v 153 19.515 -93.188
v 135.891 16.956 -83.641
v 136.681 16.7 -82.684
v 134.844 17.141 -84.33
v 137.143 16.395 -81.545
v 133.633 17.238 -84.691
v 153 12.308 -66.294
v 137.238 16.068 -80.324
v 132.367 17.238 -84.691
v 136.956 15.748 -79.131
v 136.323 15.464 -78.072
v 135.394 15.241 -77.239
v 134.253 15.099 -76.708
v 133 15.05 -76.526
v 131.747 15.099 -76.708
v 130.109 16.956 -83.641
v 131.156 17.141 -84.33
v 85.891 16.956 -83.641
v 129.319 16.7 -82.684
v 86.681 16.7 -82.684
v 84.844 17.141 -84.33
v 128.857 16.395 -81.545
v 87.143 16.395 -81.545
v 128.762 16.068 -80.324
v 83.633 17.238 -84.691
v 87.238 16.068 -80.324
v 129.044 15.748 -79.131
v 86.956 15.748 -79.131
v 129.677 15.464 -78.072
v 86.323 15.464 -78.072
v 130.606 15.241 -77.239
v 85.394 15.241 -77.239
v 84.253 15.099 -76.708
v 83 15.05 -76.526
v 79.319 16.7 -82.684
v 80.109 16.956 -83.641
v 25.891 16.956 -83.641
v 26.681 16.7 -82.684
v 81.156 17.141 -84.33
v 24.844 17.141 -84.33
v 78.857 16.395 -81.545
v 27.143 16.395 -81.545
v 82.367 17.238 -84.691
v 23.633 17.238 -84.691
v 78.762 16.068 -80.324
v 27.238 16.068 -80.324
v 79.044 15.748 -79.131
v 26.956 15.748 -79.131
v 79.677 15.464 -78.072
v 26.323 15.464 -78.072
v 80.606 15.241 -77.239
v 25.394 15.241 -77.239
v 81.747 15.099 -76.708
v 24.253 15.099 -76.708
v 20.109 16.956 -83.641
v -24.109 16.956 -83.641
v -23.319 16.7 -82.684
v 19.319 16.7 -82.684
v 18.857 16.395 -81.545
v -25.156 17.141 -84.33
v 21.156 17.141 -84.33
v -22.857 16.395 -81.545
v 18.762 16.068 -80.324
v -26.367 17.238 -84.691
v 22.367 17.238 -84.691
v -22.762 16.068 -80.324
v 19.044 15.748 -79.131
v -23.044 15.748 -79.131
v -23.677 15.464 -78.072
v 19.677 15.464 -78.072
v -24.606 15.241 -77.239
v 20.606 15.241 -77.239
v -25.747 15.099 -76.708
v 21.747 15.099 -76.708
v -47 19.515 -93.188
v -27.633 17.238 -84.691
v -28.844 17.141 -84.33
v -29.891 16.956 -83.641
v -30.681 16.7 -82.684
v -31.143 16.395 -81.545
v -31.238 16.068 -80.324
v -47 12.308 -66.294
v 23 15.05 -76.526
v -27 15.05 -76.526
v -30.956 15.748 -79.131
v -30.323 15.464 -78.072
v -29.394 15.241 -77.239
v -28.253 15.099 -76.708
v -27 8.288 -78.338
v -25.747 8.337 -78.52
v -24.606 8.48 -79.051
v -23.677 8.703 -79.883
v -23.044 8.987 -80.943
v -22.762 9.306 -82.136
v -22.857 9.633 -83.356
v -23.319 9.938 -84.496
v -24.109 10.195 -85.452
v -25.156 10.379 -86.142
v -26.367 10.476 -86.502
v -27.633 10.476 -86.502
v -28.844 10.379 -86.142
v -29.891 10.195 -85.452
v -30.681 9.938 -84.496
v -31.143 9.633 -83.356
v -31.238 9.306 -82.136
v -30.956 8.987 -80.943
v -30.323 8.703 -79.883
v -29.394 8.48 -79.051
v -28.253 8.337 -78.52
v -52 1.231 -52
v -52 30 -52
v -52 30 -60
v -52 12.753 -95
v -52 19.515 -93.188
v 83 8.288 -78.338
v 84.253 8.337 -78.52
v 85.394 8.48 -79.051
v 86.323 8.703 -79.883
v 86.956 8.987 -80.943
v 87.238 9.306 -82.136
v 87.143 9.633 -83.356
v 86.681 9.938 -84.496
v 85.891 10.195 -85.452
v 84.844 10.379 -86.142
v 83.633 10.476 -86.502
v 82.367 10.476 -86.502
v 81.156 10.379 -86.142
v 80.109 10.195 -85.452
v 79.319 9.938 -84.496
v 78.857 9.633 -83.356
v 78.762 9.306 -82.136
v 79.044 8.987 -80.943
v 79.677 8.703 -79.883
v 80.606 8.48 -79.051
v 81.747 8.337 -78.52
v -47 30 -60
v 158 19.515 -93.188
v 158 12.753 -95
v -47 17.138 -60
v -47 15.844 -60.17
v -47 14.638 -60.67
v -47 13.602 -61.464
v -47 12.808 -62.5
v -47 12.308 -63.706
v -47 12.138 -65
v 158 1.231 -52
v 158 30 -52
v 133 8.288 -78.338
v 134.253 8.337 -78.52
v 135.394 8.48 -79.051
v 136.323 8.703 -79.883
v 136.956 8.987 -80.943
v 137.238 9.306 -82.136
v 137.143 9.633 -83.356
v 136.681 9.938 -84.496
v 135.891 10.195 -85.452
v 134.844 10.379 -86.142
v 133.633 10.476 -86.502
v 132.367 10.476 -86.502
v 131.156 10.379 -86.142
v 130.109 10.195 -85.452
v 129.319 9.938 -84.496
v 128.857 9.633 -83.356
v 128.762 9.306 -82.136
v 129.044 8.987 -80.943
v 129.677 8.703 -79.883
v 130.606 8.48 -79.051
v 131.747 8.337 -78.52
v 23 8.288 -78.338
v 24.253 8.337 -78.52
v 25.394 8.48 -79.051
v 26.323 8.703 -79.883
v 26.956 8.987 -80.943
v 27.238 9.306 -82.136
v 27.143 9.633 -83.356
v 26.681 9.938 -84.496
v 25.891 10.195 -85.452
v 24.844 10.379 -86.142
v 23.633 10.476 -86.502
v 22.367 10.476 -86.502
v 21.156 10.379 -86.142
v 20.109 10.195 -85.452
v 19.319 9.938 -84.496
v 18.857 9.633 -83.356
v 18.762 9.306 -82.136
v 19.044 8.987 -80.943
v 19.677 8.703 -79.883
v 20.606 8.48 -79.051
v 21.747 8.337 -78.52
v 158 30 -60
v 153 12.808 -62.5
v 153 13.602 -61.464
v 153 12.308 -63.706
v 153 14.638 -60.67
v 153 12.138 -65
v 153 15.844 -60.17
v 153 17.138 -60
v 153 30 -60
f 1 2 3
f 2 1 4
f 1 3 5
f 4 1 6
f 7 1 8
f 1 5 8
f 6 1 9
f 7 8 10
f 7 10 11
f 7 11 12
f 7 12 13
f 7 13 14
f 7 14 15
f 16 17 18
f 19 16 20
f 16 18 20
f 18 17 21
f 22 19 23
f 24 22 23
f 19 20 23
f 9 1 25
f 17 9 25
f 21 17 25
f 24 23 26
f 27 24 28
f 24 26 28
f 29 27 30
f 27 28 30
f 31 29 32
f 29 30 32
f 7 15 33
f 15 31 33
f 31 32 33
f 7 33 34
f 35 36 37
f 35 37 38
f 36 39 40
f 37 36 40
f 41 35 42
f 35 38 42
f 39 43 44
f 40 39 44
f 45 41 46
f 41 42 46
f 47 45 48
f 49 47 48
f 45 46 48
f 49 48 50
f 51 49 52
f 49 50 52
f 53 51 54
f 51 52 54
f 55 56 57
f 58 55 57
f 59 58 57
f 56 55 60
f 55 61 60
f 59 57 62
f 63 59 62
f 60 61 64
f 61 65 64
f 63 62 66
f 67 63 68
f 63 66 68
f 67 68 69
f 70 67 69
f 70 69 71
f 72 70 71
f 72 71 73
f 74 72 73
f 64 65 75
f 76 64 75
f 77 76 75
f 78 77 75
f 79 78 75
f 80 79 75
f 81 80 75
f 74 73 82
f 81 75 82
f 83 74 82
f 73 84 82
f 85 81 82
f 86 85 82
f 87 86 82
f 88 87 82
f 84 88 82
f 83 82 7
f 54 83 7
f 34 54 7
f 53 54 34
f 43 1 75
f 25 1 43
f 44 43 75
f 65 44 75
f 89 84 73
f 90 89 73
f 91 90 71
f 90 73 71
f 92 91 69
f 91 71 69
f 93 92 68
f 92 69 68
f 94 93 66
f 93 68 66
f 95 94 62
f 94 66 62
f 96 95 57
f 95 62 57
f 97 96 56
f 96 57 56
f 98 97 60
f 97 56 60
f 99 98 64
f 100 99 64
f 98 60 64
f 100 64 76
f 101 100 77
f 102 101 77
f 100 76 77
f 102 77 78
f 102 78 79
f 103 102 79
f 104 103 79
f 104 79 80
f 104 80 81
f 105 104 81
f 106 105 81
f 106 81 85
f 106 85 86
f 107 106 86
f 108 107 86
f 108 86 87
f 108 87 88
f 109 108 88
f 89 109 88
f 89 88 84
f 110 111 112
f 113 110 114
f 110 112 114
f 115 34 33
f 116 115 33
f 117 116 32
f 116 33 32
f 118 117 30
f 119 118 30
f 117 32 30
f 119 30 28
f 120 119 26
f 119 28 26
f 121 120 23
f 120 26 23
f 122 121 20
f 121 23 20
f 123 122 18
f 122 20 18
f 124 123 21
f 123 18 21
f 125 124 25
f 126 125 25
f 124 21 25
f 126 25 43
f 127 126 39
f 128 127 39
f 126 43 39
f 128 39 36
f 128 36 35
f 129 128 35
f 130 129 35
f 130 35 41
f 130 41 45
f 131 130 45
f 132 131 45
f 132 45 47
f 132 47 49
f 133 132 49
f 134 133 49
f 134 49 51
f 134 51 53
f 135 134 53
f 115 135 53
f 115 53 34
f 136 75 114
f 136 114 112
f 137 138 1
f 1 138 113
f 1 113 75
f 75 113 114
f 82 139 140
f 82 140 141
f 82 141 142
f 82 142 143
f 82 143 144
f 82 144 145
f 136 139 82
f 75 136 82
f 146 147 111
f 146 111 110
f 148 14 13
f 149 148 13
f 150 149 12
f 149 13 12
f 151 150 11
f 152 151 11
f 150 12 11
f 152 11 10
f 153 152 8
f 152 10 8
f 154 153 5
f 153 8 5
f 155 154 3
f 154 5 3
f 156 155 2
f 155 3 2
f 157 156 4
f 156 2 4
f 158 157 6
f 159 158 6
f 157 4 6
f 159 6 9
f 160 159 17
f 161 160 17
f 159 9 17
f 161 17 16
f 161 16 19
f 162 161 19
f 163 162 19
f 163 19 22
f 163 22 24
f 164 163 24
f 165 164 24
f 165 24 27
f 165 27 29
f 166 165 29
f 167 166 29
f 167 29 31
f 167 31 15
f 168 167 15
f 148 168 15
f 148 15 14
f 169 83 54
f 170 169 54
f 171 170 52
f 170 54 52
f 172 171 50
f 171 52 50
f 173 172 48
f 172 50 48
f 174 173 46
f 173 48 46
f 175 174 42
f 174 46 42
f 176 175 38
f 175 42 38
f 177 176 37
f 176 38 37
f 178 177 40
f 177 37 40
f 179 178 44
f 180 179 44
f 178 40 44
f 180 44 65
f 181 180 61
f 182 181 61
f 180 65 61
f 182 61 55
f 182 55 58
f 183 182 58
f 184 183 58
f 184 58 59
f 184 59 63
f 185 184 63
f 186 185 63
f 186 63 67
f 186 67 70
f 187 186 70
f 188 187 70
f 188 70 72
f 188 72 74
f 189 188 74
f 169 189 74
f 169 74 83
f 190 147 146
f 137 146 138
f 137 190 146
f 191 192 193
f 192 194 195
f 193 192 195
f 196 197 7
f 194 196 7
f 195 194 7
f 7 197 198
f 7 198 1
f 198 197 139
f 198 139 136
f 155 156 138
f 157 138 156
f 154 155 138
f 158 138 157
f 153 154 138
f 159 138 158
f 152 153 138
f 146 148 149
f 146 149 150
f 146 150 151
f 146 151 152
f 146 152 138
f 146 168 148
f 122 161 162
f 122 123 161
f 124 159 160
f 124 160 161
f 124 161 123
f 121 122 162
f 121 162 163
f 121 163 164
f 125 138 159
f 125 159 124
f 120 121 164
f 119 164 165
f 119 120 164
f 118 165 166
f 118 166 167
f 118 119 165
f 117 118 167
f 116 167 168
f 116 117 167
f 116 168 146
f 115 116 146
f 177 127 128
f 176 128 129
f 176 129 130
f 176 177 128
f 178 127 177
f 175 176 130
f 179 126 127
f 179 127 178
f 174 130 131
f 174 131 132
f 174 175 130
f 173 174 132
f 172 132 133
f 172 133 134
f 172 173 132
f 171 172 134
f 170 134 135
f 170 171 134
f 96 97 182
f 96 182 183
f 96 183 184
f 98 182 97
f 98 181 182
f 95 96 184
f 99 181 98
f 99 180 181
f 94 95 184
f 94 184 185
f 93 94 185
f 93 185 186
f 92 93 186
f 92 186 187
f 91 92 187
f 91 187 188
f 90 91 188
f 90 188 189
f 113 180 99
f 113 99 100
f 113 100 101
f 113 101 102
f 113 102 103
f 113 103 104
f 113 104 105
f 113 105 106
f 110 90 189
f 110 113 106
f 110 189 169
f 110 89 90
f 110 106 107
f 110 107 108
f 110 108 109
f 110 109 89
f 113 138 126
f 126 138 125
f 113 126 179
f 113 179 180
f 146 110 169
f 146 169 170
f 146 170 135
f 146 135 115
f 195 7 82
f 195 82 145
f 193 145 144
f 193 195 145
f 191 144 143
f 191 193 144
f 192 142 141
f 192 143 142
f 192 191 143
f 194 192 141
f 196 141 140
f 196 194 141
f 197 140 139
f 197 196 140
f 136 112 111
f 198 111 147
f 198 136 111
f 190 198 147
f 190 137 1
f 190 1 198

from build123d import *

# Parameters (mm, degrees)
EXTRUDE_1_DEPTH      = 30
SKETCH_2_R           = 44.45
CUT_EXTRUDE_1_DEPTH  = 4
SKETCH_3_R           = 25.5
SKETCH_3_R_2         = 2.25
CUT_EXTRUDE_2_DEPTH  = 188.619295383
CUT_EXTRUDE_3_DEPTH  = 189.215302247
SKETCH_5_R           = 1.65
CUT_EXTRUDE_4_DEPTH  = 189.215302247
EXTRUDE_START        = -30
EXTRUDE_2_DEPTH      = 30
CUT_EXTRUDE_5_DEPTH  = 198.040604952
CUT_EXTRUDE_7_DEPTH  = 233.432785983
CUT_EXTRUDE_8_DEPTH  = 233.432785983
CUT_EXTRUDE_9_DEPTH  = 233.432785983
FILLET_1_R           = 5
CUT_EXTRUDE_10_DEPTH = 233.432785983
EXTRUDE_START_2      = -5
EXTRUDE_3_DEPTH      = 5
EXTRUDE_4_DEPTH      = 5
SKETCH_14_R          = 4.25
CUT_EXTRUDE_11_DEPTH = 189.364728478
SKETCH_16_W          = 43
SKETCH_16_H          = 30
CUT_EXTRUDE_12_DEPTH = 233.432785983
EXTRUDE_7_REACH      = 188.592
SKETCH_18_W          = 210
SKETCH_18_H          = 5
EXTRUDE_8_DEPTH      = 210
EXTRUDE_9_DEPTH      = 5
EXTRUDE_10_DEPTH     = 5
SKETCH_22_R          = 4.25
CUT_EXTRUDE_13_DEPTH = 187.984035343
FILLET_2_R           = 5
CUT_EXTRUDE_14_DEPTH = 234.418610938


with BuildPart() as part:
    # 草图1 → 凸台-拉伸1 (new body)
    with BuildSketch(Plane(origin=(0, 0, 0), x_dir=(1, 0, 0), z_dir=(0, 1, 0))):
        with BuildLine():
            Line((170, 31.93), (170, -31.93))
            ThreePointArc((170, -31.93), (167.781993847, -38.210172909), (162.111885646, -41.704453387))
            Line((162.111885646, -41.704453387), (15.839142344, -73.308400404))
            ThreePointArc((15.839142344, -73.308400404), (-75, 0), (15.839142344, 73.308400404))
            Line((15.839142344, 73.308400404), (162.111885646, 41.704453387))
            ThreePointArc((162.111885646, 41.704453387), (167.781993847, 38.210172909), (170, 31.93))
        make_face()
    extrude(amount=EXTRUDE_1_DEPTH)

    # 草图2 → 切除-拉伸1 (cut)
    with BuildSketch(Plane(origin=(0, 30, 0), x_dir=(1, 0, 0), z_dir=(0, 1, 0))):
        with Locations(Location((0, 0, 0), (0, 0, 270))):
            Circle(SKETCH_2_R)
    extrude(amount=-CUT_EXTRUDE_1_DEPTH, mode=Mode.SUBTRACT)

    # 草图3 → 切除-拉伸2 (cut, through all)
    with BuildSketch(Plane(origin=(0, 26, 0), x_dir=(1, 0, 0), z_dir=(0, 1, 0))):
        with Locations(Location((0, 0, 0), (0, 0, 270))):
            Circle(SKETCH_3_R)
        with Locations(Location((0, 41, 0), (0, 0, 270))):
            Circle(SKETCH_3_R_2)
        with Locations(Location((28.991378029, 28.991378029, 0), (0, 0, 270))):
            Circle(SKETCH_3_R_2)
        with Locations(Location((41, 0, 0), (0, 0, 270))):
            Circle(SKETCH_3_R_2)
        with Locations(Location((28.991378029, -28.991378029, 0), (0, 0, 270))):
            Circle(SKETCH_3_R_2)
        with Locations(Location((0, -41, 0), (0, 0, 270))):
            Circle(SKETCH_3_R_2)
        with Locations(Location((-28.991378029, -28.991378029, 0), (0, 0, 270))):
            Circle(SKETCH_3_R_2)
        with Locations(Location((-41, 0, 0), (0, 0, 270))):
            Circle(SKETCH_3_R_2)
        with Locations(Location((-28.991378029, 28.991378029, 0), (0, 0, 270))):
            Circle(SKETCH_3_R_2)
    extrude(amount=-CUT_EXTRUDE_2_DEPTH, mode=Mode.SUBTRACT)

    # 草图4 → 切除-拉伸3 (cut, through all)
    with BuildSketch(Plane(origin=(0, 30, 0), x_dir=(1, 0, 0), z_dir=(0, 1, 0))):
        with BuildLine():
            Line((124, 18.5), (134, 18.5))
            ThreePointArc((134, 18.5), (152.5, 0), (134, -18.5))
            Line((134, -18.5), (124, -18.5))
            ThreePointArc((124, -18.5), (105.5, 0), (124, 18.5))
        make_face()
    extrude(amount=-CUT_EXTRUDE_3_DEPTH, mode=Mode.SUBTRACT)

    # 草图5 → 切除-拉伸4 (cut, through all)
    with BuildSketch(Plane(origin=(0, 30, 0), x_dir=(1, 0, 0), z_dir=(0, 1, 0))):
        with Locations(Location((116.75, 25.5, 0), (0, 0, 270))):
            Circle(SKETCH_5_R)
        with Locations(Location((141.25, 25.5, 0), (0, 0, 270))):
            Circle(SKETCH_5_R)
        with Locations(Location((141.25, -25.5, 0), (0, 0, 270))):
            Circle(SKETCH_5_R)
        with Locations(Location((116.75, -25.5, 0), (0, 0, 270))):
            Circle(SKETCH_5_R)
    extrude(amount=-CUT_EXTRUDE_4_DEPTH, mode=Mode.SUBTRACT)

    # 草图6 → 凸台-拉伸2 (add)
    with BuildSketch(Plane(origin=(0, 30, 0), x_dir=(1, 0, 0), z_dir=(0, 1, 0)).offset(EXTRUDE_START)):
        with BuildLine():
            Line((158, 95), (-52, 95))
            Line((-52, 95), (-52, 54.046276467))
            ThreePointArc((-52, 54.046276467), (-20.48558667, 72.148047366), (15.839142344, 73.308400404))
            Line((15.839142344, 73.308400404), (158, 42.592874655))
            Line((158, 42.592874655), (158, 95))
        make_face()
        with BuildLine():
            ThreePointArc((15.839142344, -73.308400404), (-20.48558667, -72.148047366), (-52, -54.046276467))
            Line((-52, -54.046276467), (-52, -95))
            Line((-52, -95), (158, -95))
            Line((158, -95), (158, -42.592874655))
            Line((158, -42.592874655), (15.839142344, -73.308400404))
        make_face()
    extrude(amount=EXTRUDE_2_DEPTH)

    # 草图7 → 切除-拉伸5 (cut, through all)
    with BuildSketch(Plane(origin=(0, 30, 0), x_dir=(1, 0, 0), z_dir=(0, 1, 0))):
        with BuildLine():
            Line((-52, 54.046276467), (-52, -54.046276467))
            ThreePointArc((-52, -54.046276467), (-75, 0), (-52, 54.046276467))
        make_face()
        with BuildLine():
            Line((158, 42.592874655), (158, -42.592874655))
            Line((158, -42.592874655), (162.111885646, -41.704453387))
            ThreePointArc((162.111885646, -41.704453387), (167.781993847, -38.210172909), (170, -31.93))
            Line((170, -31.93), (170, 31.93))
            ThreePointArc((170, 31.93), (167.781993847, 38.210172909), (162.111885646, 41.704453387))
            Line((162.111885646, 41.704453387), (158, 42.592874655))
        make_face()
    extrude(amount=-CUT_EXTRUDE_5_DEPTH, mode=Mode.SUBTRACT)

    # 草图9 → 切除-拉伸7 (cut, through all)
    with BuildSketch(Plane.ZY.offset(52)):
        Polygon((-95, 20), (-60, 10.621778265), (-60, 30), (-95, 30), align=None)
    extrude(amount=-CUT_EXTRUDE_7_DEPTH, mode=Mode.SUBTRACT)

    # 草图10 → 切除-拉伸8 (cut, through all)
    with BuildSketch(Plane.ZY.offset(52)):
        Polygon((-95, 12.753066737), (-52, 1.231251463), (-52, 0), (-95, 0), align=None)
    extrude(amount=-CUT_EXTRUDE_8_DEPTH, mode=Mode.SUBTRACT)

    # 草图8 → 切除-拉伸9 (cut, through all)
    with BuildSketch(Plane.ZY.offset(52)):
        Polygon((0, 0), (52, 0), (52, 17.3), (-52, 17.3), (-52, 0), align=None)
    extrude(amount=-CUT_EXTRUDE_9_DEPTH, mode=Mode.SUBTRACT)

    # 圆角1
    fillet_1_edges = [part.edges().sort_by_distance(p)[0] for p in [
        (53, 10.621778265, -60),
    ]]
    fillet(fillet_1_edges, radius=FILLET_1_R)

    # 草图11 → 切除-拉伸10 (cut, through all)
    with BuildSketch(Plane.ZY.offset(52)):
        Polygon((-95, 12.753066737), (-93.188266684, 19.514547521), (-95, 20), align=None)
    extrude(amount=-CUT_EXTRUDE_10_DEPTH, mode=Mode.SUBTRACT)

    # 草图12 → 凸台-拉伸3 (add)
    with BuildSketch(Plane.ZY.offset(52).offset(EXTRUDE_START_2)):
        with BuildLine():
            Line((-93.188266684, 19.514547521), (-60, 30))
            Line((-60, 30), (-60, 17.137905129))
            ThreePointArc((-60, 17.137905129), (-61.956192855, 13.171138428), (-66.294095226, 12.308275998))
            Line((-66.294095226, 12.308275998), (-93.188266684, 19.514547521))
        make_face()
    extrude(amount=EXTRUDE_3_DEPTH)

    # 草图13 → 凸台-拉伸4 (add)
    with BuildSketch(Plane(origin=(158, 0, 0), x_dir=(0, 0, -1), z_dir=(1, 0, 0))):
        with BuildLine():
            Line((66.294095226, 12.308275998), (93.188266684, 19.514547521))
            Line((93.188266684, 19.514547521), (60, 30))
            Line((60, 30), (60, 17.137905129))
            ThreePointArc((60, 17.137905129), (61.956192855, 13.171138428), (66.294095226, 12.308275998))
        make_face()
    extrude(amount=-EXTRUDE_4_DEPTH)

    # 草图14 → 切除-拉伸11 (cut, through all)
    with BuildSketch(Plane(origin=(0, -5.089745962, -1.36379332), x_dir=(1, 0, 0), z_dir=(0, 0.9659258262890681, 0.2588190451025214))):
        with Locations(Location((-27, 82.063690052, 0), (0, 0, 270))):
            Circle(SKETCH_14_R)
        with Locations(Location((23, 82.063690052, 0), (0, 0, 270))):
            Circle(SKETCH_14_R)
        with Locations(Location((83, 82.063690052, 0), (0, 0, 270))):
            Circle(SKETCH_14_R)
        with Locations(Location((133, 82.063690052, 0), (0, 0, 270))):
            Circle(SKETCH_14_R)
    extrude(amount=-CUT_EXTRUDE_11_DEPTH, mode=Mode.SUBTRACT)

    # 草图16 → 切除-拉伸12 (cut, through all)
    with BuildSketch(Plane.ZY.offset(52)):
        with Locations((73.5, 15)):
            Rectangle(SKETCH_16_W, SKETCH_16_H)
    extrude(amount=-CUT_EXTRUDE_12_DEPTH, mode=Mode.SUBTRACT)

    # 凸台-拉伸7: up to this plane
    extrude_7_end = Plane(origin=(0, -11.851226746, -3.175526636), z_dir=(0, -0.9659258262890681, -0.25881904510252146))
    # 草图18 → 凸台-拉伸7 (add, up to the surface)
    with BuildSketch(Plane(origin=(0, 30, 0), x_dir=(1, 0, 0), z_dir=(0, 1, 0)), mode=Mode.PRIVATE) as extrude_7_sk1:
        with Locations((53, -54.5)):
            Rectangle(SKETCH_18_W, SKETCH_18_H)
    extrude_7_tool1 = split(extrude(extrude_7_sk1.sketch, amount=-EXTRUDE_7_REACH, mode=Mode.PRIVATE), bisect_by=extrude_7_end, keep=Keep.BOTH, mode=Mode.PRIVATE)
    add(extrude_7_tool1.solids().sort_by_distance((53, 30, 54.5))[0])

    # 草图19 → 凸台-拉伸8 (add)
    with BuildSketch(Plane.ZY.offset(52)):
        Polygon((57, -27.975210512), (90.188266684, -36.867979769), (92, -30.106498985), (57, -20.72827725), align=None)
    extrude(amount=-EXTRUDE_8_DEPTH)

    # 草图20 → 凸台-拉伸9 (add)
    with BuildSketch(Plane.ZY.offset(52)):
        Polygon((92, -30.106498985), (57, -20.72827725), (57, 30), align=None)
    extrude(amount=-EXTRUDE_9_DEPTH)

    # 草图21 → 凸台-拉伸10 (add)
    with BuildSketch(Plane(origin=(158, 0, 0), x_dir=(0, 0, -1), z_dir=(1, 0, 0))):
        Polygon((-57, 30), (-92, -30.106498985), (-57, -20.72827725), align=None)
    extrude(amount=-EXTRUDE_10_DEPTH)

    # 草图22 → 切除-拉伸13 (cut, through all)
    with BuildSketch(Plane(origin=(0, -5.089745962, -1.36379332), x_dir=(1, 0, 0), z_dir=(0, 0.9659258262890686, 0.25881904510251946))):
        with Locations(Location((-27, -77.936309948, 0), (0, 0, 270))):
            Circle(SKETCH_22_R)
        with Locations(Location((23, -69.936309948, 0), (0, 0, 270))):
            Circle(SKETCH_22_R)
        with Locations(Location((83, -69.936309948, 0), (0, 0, 270))):
            Circle(SKETCH_22_R)
        with Locations(Location((133, -77.936309948, 0), (0, 0, 270))):
            Circle(SKETCH_22_R)
    extrude(amount=-CUT_EXTRUDE_13_DEPTH, mode=Mode.SUBTRACT)

    # 圆角2
    fillet_2_edges = [part.edges().sort_by_distance(p)[0] for p in [
        (53, -20.72827725, 57),
    ]]
    fillet(fillet_2_edges, radius=FILLET_2_R)

    # 草图23 → 切除-拉伸14 (cut, through all)
    with BuildSketch(Plane.ZY.offset(52)):
        Polygon((-52, 17.3), (-52, 40.52409207), (98.672945053, 40.52409207), (98.672945053, -43.91232927), (-52, -43.91232927), align=None)
    extrude(amount=-CUT_EXTRUDE_14_DEPTH, mode=Mode.SUBTRACT)


solid = part.part
